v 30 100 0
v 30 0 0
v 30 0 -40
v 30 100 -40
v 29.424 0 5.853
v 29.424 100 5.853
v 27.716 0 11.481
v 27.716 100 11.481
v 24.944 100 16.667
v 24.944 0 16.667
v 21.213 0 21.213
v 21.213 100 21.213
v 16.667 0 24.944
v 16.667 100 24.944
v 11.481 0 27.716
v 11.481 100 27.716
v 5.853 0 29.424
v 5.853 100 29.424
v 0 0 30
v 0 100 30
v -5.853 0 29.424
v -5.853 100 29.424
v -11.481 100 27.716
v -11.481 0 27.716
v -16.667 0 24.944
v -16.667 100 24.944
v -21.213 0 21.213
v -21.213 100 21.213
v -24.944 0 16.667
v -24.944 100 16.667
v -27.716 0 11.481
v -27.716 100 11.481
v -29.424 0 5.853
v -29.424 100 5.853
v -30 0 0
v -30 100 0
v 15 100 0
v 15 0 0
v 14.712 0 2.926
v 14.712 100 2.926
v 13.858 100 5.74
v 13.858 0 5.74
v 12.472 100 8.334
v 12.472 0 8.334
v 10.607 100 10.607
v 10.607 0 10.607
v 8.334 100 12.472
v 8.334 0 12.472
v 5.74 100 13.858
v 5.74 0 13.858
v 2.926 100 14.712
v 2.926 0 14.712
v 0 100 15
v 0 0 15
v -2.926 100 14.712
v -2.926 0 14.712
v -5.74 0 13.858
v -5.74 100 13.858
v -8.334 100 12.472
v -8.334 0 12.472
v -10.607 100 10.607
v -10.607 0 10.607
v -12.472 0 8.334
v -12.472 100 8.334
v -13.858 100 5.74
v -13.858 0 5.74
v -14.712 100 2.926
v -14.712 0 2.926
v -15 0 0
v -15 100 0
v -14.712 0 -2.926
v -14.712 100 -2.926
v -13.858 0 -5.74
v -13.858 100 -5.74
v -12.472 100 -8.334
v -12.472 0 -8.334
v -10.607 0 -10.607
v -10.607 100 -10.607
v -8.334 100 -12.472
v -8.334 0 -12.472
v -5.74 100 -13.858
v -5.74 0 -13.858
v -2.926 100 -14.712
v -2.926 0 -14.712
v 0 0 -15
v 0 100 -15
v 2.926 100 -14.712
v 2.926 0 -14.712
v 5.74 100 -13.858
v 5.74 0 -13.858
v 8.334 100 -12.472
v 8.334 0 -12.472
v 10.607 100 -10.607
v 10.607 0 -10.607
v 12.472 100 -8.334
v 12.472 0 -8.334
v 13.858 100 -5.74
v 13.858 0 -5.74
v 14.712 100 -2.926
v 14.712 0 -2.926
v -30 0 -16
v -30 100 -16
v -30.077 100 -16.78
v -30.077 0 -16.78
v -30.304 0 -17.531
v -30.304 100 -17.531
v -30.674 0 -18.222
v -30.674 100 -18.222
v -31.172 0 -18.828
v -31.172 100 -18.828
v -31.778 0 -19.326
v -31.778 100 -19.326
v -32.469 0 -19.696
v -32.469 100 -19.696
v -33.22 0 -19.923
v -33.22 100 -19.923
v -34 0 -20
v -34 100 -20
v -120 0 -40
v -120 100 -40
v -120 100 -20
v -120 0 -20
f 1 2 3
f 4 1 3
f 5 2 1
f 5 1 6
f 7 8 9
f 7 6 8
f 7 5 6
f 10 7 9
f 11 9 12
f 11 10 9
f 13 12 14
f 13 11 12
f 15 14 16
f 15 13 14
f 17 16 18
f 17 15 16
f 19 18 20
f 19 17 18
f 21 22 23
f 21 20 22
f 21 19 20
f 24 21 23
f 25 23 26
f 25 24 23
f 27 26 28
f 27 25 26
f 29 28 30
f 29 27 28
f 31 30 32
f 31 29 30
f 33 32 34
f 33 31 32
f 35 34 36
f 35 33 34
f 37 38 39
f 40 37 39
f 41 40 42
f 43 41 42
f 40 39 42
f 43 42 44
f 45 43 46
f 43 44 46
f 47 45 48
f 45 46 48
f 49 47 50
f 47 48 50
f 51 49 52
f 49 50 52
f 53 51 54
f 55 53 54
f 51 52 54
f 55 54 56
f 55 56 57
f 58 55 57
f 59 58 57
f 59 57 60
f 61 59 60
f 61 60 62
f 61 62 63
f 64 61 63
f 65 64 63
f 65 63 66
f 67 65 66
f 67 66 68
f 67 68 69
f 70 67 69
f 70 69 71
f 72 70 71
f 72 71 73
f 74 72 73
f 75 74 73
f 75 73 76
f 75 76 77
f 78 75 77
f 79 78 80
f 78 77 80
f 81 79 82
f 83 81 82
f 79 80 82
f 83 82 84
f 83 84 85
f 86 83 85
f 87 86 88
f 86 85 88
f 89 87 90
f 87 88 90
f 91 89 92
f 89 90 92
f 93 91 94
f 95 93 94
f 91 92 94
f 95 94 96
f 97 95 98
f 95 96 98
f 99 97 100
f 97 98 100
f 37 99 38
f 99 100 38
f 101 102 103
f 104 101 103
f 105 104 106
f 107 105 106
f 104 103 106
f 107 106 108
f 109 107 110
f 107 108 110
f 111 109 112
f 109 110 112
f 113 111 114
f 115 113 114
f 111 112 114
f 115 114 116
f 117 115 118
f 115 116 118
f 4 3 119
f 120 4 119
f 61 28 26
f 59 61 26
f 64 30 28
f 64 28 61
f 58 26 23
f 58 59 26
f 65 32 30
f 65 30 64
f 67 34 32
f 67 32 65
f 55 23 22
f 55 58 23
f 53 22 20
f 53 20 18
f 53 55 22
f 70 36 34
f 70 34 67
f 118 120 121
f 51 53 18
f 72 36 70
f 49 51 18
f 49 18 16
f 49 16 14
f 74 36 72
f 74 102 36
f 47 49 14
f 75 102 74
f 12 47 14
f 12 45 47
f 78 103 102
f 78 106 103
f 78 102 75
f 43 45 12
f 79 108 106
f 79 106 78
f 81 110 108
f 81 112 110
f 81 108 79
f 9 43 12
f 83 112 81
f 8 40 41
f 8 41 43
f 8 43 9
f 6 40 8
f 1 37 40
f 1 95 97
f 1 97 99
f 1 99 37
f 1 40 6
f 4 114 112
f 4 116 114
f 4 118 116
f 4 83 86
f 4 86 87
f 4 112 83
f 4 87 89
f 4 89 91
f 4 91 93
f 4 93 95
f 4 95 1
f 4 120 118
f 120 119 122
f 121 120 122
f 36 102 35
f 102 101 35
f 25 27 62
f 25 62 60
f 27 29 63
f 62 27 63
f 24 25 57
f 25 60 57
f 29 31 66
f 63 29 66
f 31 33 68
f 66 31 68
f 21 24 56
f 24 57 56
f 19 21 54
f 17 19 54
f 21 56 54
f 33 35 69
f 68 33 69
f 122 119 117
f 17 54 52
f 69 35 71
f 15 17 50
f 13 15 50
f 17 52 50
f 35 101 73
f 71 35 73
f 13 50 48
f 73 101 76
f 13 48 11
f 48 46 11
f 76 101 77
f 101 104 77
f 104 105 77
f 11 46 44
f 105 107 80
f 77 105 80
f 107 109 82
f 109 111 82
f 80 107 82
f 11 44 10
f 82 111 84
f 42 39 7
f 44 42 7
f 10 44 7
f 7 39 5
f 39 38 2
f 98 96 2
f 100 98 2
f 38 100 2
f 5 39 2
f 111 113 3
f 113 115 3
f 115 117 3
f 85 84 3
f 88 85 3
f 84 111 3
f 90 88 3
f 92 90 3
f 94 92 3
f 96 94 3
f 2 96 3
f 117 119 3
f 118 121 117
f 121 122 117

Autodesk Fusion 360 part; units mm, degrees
sketch "Sketch1" plane through (0, 0, 0) normal (0, 1, 0) x (1, 0, 0)
  line L0 (30, 40) -> (-120, 40)
  line L1 (-120, 40) -> (-120, 20)
  line L2 (-120, 20) -> (-30, 20)
  line L3 (-30, 20) -> (-30, 0)
  arc A0 (-30, 0) -> (30, 0) centre (0, 0) ccw
  line L4 (30, 0) -> (30, 40)
  dimension "d3" = 30
  dimension "d4" = 150
  dimension "d5" = 20
  dimension "d6" = 40
extrude "Extrude1" add sketch "Sketch1" along normal blind 100
fillet "Fillet1" radius 4 1 edges at (-30, 50, -20)
sketch "Sketch2" plane through (0, 0, 0) normal (0, -1, 0) x (1, 0, 0)
  line L0 (30, -40) -> (30, 0)
  arc A0 (30, 0) -> (-30, 0) centre (0, 0) ccw
  line L1 (-30, 0) -> (-30, -16)
  arc A1 (-34, -20) -> (-30, -16) centre (-34, -16) ccw
  line L2 (-34, -20) -> (-120, -20)
  line L3 (-120, -20) -> (-120, -40)
  line L4 (-120, -40) -> (30, -40)
  circle A2 centre (0, 0) radius 15
  dimension "d10" = 30
extrude "Extrude2" cut sketch "Sketch2" against normal blind 100 contours A2
